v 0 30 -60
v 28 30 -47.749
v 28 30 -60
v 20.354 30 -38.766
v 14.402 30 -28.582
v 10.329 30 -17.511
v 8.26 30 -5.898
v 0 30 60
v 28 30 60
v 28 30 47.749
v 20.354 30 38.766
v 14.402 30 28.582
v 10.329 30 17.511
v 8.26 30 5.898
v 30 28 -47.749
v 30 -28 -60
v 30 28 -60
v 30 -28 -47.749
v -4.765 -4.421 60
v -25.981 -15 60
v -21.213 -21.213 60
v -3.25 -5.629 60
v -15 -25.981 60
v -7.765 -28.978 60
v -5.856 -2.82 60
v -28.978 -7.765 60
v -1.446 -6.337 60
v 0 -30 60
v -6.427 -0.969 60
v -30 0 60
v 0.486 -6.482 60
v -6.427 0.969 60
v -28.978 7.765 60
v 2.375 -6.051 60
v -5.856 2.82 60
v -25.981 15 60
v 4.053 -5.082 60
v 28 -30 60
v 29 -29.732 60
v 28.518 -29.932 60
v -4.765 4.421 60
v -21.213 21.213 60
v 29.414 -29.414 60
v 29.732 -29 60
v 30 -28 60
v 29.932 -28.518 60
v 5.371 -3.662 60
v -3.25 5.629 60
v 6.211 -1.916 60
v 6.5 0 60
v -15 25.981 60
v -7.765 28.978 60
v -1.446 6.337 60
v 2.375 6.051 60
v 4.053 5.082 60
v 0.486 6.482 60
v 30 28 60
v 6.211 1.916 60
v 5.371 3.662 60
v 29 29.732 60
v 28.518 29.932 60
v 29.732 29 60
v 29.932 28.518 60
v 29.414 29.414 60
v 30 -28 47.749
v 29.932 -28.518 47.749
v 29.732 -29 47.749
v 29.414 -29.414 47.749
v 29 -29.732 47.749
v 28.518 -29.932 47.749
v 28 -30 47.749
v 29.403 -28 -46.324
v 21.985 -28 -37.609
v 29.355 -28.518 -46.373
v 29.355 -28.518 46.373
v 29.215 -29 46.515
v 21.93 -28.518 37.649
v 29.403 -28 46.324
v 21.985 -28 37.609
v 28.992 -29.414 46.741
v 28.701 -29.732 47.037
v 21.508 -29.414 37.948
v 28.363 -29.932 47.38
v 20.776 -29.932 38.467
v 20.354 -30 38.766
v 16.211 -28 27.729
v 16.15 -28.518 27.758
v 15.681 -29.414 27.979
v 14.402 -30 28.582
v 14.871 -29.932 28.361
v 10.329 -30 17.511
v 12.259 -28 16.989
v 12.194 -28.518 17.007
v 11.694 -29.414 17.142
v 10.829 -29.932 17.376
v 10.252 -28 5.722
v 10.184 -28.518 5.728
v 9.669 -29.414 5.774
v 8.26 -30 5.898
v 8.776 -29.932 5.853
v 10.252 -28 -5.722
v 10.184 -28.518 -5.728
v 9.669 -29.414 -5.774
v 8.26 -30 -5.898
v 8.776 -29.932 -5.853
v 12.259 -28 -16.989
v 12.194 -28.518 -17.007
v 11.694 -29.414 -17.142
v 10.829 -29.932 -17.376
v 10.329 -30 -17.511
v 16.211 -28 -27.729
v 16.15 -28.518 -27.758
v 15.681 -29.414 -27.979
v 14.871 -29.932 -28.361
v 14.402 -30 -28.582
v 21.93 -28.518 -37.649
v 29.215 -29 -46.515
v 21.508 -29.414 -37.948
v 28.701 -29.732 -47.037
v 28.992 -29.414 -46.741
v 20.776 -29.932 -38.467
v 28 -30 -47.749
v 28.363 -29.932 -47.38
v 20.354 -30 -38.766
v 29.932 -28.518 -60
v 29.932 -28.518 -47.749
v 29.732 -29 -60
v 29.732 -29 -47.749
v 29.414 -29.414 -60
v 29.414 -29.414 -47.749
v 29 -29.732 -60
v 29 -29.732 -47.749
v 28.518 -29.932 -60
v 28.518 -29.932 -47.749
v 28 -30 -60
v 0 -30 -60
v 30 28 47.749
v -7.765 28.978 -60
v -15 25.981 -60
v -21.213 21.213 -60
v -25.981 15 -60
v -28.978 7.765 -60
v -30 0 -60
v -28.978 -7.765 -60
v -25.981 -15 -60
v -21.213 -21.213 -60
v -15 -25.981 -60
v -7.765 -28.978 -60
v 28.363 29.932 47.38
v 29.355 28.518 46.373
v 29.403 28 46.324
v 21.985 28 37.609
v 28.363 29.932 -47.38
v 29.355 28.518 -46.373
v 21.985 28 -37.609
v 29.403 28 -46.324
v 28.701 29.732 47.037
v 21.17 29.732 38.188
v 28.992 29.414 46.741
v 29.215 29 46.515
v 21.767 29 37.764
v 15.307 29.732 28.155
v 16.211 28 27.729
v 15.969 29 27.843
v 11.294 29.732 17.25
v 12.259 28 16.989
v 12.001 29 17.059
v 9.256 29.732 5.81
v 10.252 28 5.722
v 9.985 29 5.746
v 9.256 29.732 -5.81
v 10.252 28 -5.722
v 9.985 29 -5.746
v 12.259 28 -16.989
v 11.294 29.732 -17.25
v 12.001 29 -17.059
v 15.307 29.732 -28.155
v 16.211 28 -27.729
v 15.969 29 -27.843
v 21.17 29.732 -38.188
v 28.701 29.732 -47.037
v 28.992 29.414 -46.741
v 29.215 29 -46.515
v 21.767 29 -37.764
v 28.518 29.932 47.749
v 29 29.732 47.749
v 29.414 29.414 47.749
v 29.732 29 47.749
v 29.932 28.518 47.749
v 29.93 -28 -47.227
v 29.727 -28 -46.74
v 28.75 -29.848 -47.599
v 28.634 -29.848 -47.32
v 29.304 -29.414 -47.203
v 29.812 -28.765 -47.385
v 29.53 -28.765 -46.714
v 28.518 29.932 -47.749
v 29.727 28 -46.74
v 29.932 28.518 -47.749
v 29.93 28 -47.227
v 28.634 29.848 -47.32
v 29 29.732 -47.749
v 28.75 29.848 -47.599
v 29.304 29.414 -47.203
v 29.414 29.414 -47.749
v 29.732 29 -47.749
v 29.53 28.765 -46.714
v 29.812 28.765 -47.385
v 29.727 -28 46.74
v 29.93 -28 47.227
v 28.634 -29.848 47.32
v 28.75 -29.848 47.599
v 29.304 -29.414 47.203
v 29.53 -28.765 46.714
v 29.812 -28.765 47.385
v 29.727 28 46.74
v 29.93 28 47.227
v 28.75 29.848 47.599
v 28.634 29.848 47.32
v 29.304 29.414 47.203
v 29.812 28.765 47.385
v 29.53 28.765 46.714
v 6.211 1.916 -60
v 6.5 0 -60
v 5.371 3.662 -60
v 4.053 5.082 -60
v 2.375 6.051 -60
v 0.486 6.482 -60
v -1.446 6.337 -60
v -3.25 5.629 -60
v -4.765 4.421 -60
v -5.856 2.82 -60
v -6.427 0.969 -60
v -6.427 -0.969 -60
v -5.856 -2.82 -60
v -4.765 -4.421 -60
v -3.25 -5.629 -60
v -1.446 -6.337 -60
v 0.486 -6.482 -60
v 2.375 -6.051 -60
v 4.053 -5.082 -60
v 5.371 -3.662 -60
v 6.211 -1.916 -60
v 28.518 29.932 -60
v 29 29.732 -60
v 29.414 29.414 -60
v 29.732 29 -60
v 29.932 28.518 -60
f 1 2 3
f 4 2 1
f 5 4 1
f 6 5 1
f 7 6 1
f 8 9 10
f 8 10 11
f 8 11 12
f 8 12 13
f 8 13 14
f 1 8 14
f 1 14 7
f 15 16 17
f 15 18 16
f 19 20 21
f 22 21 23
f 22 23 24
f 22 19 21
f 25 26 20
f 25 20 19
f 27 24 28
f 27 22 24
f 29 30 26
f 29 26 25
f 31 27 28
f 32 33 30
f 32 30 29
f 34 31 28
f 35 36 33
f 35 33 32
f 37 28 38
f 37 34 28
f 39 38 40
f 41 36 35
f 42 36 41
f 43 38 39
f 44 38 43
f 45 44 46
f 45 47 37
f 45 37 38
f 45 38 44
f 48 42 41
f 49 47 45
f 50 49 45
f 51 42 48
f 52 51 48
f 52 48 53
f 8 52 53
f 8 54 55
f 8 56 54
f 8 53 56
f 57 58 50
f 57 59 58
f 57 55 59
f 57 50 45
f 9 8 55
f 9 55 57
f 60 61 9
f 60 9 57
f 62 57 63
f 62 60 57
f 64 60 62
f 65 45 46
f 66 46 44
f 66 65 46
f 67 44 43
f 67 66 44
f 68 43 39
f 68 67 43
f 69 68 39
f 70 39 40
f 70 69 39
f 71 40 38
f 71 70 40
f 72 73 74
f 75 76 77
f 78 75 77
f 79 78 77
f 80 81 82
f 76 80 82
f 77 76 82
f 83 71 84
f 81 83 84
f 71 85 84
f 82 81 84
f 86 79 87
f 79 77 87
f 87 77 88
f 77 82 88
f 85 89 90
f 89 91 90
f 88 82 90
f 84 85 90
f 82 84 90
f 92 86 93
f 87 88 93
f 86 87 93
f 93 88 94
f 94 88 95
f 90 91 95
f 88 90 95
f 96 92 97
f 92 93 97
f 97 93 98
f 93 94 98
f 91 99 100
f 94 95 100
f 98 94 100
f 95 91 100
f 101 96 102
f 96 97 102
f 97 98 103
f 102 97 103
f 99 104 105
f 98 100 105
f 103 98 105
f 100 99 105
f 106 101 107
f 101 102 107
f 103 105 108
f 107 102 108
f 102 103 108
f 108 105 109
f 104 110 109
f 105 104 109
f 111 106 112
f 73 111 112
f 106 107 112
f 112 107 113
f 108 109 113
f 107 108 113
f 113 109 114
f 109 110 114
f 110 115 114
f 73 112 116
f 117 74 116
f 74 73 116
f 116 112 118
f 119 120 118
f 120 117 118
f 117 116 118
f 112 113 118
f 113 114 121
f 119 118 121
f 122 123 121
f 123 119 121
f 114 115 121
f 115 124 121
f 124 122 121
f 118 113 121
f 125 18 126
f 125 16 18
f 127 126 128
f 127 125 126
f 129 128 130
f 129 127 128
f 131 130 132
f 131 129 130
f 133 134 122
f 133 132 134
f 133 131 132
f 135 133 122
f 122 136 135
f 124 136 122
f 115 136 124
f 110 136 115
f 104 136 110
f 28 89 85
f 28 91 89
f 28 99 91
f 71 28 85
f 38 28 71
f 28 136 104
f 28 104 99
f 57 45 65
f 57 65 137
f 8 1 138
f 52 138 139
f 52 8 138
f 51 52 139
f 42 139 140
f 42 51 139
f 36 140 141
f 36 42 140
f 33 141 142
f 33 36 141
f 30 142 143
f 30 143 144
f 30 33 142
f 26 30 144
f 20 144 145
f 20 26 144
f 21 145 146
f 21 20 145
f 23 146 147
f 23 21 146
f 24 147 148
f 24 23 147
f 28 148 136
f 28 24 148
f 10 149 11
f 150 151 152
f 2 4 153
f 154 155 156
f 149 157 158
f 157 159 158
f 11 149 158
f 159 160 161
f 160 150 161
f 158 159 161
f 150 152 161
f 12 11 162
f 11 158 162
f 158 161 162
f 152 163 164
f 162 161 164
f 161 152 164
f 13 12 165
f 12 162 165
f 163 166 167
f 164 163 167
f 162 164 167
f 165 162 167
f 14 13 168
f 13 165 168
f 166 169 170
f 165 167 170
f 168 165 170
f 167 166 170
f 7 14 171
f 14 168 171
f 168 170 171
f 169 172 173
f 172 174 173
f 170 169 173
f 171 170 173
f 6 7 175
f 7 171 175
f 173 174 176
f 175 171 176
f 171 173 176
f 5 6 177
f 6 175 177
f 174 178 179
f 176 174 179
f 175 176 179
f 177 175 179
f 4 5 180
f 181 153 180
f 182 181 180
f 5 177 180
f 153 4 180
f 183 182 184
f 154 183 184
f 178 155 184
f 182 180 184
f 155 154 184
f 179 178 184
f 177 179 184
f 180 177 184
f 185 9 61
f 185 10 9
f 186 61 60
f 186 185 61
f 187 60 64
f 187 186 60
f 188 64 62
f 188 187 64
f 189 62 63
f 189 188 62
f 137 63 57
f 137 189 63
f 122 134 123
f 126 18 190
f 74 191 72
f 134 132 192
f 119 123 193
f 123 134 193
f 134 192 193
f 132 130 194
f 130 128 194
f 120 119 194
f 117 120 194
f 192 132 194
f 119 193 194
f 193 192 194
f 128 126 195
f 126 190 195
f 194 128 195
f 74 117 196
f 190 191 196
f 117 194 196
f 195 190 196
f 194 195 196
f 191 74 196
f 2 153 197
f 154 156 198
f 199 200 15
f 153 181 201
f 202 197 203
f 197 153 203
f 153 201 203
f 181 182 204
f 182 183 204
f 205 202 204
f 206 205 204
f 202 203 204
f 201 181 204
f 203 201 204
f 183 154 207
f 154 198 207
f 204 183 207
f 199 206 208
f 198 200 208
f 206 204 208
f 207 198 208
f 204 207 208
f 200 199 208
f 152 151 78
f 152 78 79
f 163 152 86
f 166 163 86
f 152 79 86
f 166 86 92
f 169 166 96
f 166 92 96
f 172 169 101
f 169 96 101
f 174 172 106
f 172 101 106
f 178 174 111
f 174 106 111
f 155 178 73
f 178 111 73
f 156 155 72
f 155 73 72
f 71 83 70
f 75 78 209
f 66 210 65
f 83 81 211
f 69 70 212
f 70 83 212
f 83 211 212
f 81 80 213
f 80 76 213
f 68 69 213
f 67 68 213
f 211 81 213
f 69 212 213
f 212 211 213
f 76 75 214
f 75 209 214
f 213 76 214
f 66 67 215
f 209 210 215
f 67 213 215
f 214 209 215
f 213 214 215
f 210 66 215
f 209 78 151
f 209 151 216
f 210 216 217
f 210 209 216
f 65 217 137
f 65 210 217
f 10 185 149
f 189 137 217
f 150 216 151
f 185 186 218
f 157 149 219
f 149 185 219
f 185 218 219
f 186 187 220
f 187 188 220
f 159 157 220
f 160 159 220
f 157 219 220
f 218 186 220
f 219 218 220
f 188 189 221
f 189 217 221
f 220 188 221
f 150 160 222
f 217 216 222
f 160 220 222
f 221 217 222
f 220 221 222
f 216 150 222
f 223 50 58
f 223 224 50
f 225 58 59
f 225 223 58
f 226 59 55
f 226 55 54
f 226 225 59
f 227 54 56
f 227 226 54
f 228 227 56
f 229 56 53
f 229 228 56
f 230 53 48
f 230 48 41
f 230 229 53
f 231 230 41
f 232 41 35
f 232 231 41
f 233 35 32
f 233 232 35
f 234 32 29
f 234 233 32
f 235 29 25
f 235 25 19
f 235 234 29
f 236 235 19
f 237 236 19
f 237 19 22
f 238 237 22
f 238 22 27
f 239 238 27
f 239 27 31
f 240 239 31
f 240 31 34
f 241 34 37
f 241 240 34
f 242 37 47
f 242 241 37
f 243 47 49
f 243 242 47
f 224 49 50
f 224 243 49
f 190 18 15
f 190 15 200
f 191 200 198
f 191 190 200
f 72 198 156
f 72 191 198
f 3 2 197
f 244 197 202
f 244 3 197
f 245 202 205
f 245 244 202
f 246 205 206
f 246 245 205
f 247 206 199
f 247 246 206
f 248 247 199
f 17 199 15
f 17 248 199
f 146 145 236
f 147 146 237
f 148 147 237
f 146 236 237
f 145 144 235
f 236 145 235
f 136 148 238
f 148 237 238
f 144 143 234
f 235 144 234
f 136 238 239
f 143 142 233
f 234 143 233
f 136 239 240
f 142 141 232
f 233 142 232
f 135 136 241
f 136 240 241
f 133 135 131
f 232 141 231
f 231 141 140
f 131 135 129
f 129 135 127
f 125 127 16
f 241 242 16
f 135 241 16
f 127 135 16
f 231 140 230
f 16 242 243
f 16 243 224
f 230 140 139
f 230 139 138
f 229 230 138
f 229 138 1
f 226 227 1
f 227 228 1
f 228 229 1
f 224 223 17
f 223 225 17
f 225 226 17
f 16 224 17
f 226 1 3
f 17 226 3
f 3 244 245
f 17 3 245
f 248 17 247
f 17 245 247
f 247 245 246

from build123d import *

# Parameters (mm, degrees)
F0_R     = 6.5
F1_DEPTH = 60
F2_R     = 65
F3_DEPTH = 60
F4_R     = 2


with BuildPart() as f1:
    # F0 (on Top) → F1 (new body, symmetric)
    with BuildSketch(Plane.XY):
        with BuildLine():
            Line((30, 30), (0, 30))
            ThreePointArc((0, 30), (21.2132034356, 21.2132034356), (30, 0))
            Line((30, 0), (30, 30))
        make_face()
        with BuildLine():
            ThreePointArc((30, 0), (21.2132034356, 21.2132034356), (0, 30))
            ThreePointArc((0, 30), (-30, 0), (0, -30))
            ThreePointArc((0, -30), (21.2132034356, -21.2132034356), (30, 0))
        make_face()
        Circle(F0_R, mode=Mode.SUBTRACT)
        with BuildLine():
            Line((30, -30), (30, 0))
            ThreePointArc((30, 0), (21.2132034356, -21.2132034356), (0, -30))
            Line((0, -30), (30, -30))
        make_face()
    extrude(amount=F1_DEPTH, both=True)

    # F2 (on Front) → F3 (cut, symmetric)
    with BuildSketch(Plane.XZ):
        with Locations((75, 0)):
            Circle(F2_R)
    extrude(amount=F3_DEPTH, both=True, mode=Mode.SUBTRACT)

    # F4
    f4_edges = [f1.edges().sort_by_distance(p)[0] for p in [
        (10, -30, 0),
        (30, -30, 53.452079),
        (30, 0, -46.904158),
        (30, 0, 46.904158),
        (30, 30, 53.452079),
        (10, 30, 0),
        (30, -30, -53.452079),
        (30, 30, -53.452079),
    ]]
    fillet(f4_edges, radius=F4_R)


solid = f1.part
